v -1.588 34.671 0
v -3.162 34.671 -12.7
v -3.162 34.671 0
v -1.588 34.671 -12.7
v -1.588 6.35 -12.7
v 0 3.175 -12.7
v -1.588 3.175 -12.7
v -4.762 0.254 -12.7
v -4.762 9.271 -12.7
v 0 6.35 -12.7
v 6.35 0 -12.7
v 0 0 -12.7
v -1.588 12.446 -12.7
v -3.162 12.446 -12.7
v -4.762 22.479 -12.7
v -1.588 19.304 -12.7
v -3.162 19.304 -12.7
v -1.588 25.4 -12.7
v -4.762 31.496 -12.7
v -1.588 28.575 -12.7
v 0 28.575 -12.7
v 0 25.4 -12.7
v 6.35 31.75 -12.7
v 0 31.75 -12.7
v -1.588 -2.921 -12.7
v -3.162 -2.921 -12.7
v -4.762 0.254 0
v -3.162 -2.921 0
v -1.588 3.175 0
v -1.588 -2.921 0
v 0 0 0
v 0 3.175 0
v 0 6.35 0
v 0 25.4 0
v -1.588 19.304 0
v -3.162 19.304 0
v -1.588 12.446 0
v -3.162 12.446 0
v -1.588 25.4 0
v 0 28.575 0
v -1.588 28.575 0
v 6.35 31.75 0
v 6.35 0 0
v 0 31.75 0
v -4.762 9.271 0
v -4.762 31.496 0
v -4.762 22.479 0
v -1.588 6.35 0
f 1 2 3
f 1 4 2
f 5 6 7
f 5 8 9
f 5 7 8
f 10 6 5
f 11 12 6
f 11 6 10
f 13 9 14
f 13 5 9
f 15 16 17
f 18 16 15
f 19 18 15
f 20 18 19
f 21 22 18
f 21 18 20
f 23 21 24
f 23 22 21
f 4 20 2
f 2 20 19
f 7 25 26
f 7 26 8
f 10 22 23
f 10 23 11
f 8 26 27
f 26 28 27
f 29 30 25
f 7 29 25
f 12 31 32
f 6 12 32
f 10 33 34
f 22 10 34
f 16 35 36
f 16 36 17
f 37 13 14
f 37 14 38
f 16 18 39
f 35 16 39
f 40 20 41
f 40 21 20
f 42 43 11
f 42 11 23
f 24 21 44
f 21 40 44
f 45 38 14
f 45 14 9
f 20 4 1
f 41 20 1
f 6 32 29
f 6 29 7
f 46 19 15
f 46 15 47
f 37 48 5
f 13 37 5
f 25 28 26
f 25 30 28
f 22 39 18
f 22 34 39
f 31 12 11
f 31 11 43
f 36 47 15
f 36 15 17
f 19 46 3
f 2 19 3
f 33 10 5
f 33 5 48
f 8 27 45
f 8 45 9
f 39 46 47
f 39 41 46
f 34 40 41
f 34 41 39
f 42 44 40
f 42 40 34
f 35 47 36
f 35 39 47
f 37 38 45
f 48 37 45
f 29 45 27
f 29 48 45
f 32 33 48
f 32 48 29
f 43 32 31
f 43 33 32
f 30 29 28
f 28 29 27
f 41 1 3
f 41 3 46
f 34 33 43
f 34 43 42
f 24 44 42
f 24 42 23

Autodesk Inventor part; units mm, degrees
ref_plane "YZ Plane" through (0, 0, 0) normal (1, 0, 0) x (0, 1, 0)
ref_plane "XZ Plane" through (0, 0, 0) normal (0, 1, 0) x (-1, 0, 0)
sketch "Sketch1" plane through (0, 0, 0) normal (1, 0, 0) x (0, 1, 0)
  line L0 (0, 0) -> (31.75, 0)
  line L1 (31.75, 0) -> (31.75, -12.7)
  line L2 (31.75, -12.7) -> (0, -12.7)
  line L3 (0, -12.7) -> (0, 0)
  line L4 (28.575, 0) -> (25.4, 0)
  line L5 (25.4, 0) -> (25.4, -12.7)
  line L6 (25.4, -12.7) -> (28.575, -12.7)
  line L7 (28.575, -12.7) -> (28.575, 0)
  dimension "d0" = 31.75
  dimension "d1" = 12.7
  dimension "d4" = 3.175
  dimension "d5" = 12.7
  dimension "d6" = 3.175
extrude "Extrusion1" add sketch "Sketch1" along normal blind 6.35
extrude "Extrusion2" add sketch "Sketch1" against normal blind 1.5875 contours L0 L7 L2 L5
sketch "Sketch2" plane through (-1.5875, 0, 0) normal (-1, 0, 0) x (0, 0, 1)
  line L0 (-12.7, 34.671) -> (0, 34.671)
  line L1 (0, 34.671) -> (0, 19.304)
  line L2 (0, 19.304) -> (-12.7, 19.304)
  line L3 (-12.7, 19.304) -> (-12.7, 34.671)
  line L4 (-12.7, 31.75) -> (-12.7, 28.575) projected
  line L5 (-12.7, 25.4) -> (0, 25.4) projected
  line L6 (0, 28.575) -> (-12.7, 28.575) projected
  point P0 (0, 0)
  dimension "d9" = 12.7
  dimension "d10" = 0
  dimension "d11" = 6.096
  dimension "d12" = 6.096
extrude "Extrusion3" add sketch "Sketch2" along normal blind 3.175
sketch "Sketch3" plane through (0, 0, 0) normal (0, 0, 1) x (1, 0, 0)
  line L0 (-4.7625, 34.671) -> (-4.7625, 31.496)
  line L1 (-4.7625, 19.304) -> (-4.7625, 34.671) projected
  line L2 (-1.5875, 34.671) -> (-1.5875, 28.575) projected
  line L3 (-1.5875, 34.671) -> (-3.1623, 34.671)
  line L4 (-1.5875, 34.671) -> (-4.7625, 34.671) projected
  line L5 (-1.5875, 19.304) -> (-3.1623, 19.304)
  line L6 (-1.5875, 19.304) -> (-4.7625, 19.304) projected
  line L7 (-4.7625, 19.304) -> (-4.7625, 22.479)
  line L8 (-4.7625, 22.479) -> (-3.1623, 19.304)
  line L9 (-4.7625, 19.304) -> (-3.1623, 19.304)
  line L10 (-4.7625, 31.496) -> (-3.1623, 34.671)
  line L11 (-4.7625, 34.671) -> (-3.1623, 34.671)
  point P0 (0, 0)
  dimension "d16" = 3.175
  dimension "d17" = 1.5748
  dimension "d18" = 1.5748
  dimension "d19" = 3.175
extrude "Extrusion4" cut sketch "Sketch3" against normal through all
ref_plane "Work Plane3" through (0, 15.875, 0) normal (0, 1, 0) x (1, 0, 0)
mirror "Mirror1" about plane through (0, 15.875, 0) normal (0, 1, 0) of "Extrusion2", "Extrusion3", "Extrusion4"
equation "\"d5\" = d1"
equation "\"d9\" = d1"
properties part number "2020liftconecter"
